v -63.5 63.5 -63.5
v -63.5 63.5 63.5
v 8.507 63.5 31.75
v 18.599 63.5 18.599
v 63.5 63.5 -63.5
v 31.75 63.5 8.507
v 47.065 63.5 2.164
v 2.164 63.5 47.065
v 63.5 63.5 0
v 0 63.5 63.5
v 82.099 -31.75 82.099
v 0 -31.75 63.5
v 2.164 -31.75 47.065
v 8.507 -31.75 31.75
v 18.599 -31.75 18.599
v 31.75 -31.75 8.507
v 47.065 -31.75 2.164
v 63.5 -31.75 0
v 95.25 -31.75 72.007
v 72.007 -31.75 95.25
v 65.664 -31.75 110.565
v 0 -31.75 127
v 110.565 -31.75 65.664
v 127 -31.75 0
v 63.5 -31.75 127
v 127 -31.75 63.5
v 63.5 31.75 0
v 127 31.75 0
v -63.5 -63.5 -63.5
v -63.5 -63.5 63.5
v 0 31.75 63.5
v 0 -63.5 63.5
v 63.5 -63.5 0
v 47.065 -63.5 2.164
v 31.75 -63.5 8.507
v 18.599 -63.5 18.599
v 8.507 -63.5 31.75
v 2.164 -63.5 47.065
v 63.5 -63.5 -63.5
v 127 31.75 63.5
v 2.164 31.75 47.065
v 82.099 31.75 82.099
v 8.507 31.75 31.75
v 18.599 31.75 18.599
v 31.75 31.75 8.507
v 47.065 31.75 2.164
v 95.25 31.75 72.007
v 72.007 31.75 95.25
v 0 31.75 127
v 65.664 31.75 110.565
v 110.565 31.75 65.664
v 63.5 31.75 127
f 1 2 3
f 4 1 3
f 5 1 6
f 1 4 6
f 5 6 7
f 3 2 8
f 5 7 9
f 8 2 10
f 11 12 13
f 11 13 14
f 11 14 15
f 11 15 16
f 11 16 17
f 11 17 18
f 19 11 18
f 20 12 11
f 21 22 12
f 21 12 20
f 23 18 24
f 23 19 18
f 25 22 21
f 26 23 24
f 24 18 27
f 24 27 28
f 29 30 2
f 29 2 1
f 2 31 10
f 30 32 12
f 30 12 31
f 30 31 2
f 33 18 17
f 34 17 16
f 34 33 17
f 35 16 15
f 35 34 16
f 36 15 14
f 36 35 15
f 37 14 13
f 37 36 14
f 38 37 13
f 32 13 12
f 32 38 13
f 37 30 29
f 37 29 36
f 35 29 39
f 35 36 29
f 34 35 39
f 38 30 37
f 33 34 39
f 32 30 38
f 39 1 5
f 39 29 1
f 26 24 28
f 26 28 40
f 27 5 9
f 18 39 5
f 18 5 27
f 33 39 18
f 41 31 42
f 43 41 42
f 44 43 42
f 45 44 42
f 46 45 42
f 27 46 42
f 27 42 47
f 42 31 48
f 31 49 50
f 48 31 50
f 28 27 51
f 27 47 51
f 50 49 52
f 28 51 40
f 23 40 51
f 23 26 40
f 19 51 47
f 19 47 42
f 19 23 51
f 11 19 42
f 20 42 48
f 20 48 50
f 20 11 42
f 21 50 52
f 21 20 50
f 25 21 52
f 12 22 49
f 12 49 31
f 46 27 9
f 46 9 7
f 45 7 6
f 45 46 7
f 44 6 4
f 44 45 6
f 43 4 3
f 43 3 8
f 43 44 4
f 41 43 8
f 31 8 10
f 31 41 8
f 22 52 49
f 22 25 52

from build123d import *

# Parameters (mm, degrees)
F1_DEPTH = 63.5
F3_DEPTH = 31.75


with BuildPart() as f1:
    # F0 (on Front) → F1 (new body, symmetric)
    with BuildSketch(Plane.XZ):
        with BuildLine():
            ThreePointArc((63.5, 0), (18.598719, 18.598719), (0, 63.5))
            Line((0, 63.5), (-63.5, 63.5))
            Line((-63.5, 63.5), (-63.5, -63.5))
            Line((-63.5, -63.5), (63.5, -63.5))
            Line((63.5, -63.5), (63.5, 0))
        make_face()
    extrude(amount=F1_DEPTH, both=True)

    # F2 (on Front) → F3 (join, symmetric)
    with BuildSketch(Plane.XZ):
        with BuildLine():
            Line((0, 127), (0, 0))
            Line((0, 0), (127, 0))
            Line((127, 0), (127, 63.5))
            ThreePointArc((127, 63.5), (82.098719, 82.098719), (63.5, 127))
            Line((63.5, 127), (0, 127))
        make_face()
    extrude(amount=F3_DEPTH, both=True)


solid = f1.part
